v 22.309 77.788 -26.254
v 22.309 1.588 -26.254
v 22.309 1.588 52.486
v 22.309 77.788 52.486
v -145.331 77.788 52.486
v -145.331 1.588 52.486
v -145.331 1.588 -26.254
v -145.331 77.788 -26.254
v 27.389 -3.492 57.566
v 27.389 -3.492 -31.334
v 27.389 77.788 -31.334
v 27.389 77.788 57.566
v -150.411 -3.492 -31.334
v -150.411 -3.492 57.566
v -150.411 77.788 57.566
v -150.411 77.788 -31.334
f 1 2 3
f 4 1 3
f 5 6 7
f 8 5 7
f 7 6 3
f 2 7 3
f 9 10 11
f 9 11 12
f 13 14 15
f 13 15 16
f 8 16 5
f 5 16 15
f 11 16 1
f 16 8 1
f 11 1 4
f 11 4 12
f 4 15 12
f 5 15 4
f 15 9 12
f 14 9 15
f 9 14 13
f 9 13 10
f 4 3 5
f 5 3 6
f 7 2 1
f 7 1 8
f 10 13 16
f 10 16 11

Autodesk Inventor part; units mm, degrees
ref_plane "YZ Plane" through (0, 0, 0) normal (1, 0, 0) x (0, 1, 0)
ref_plane "XZ Plane" through (0, 0, 0) normal (0, 1, 0) x (-1, 0, 0)
ref_plane "Work Plane1" through (-43.4917, 1.5875, -7.62) normal (0, -1, 0) x (1, 0, 0)
sketch "Sketch3" plane through (-43.4917, 1.5875, -7.62) normal (0, -1, 0) x (1, 0, 0)
  line L0 (-106.9189, -23.7145) -> (70.8811, -23.7145)
  line L1 (70.8811, -23.7145) -> (70.8811, 65.1855)
  line L2 (70.8811, 65.1855) -> (-106.9189, 65.1855)
  line L3 (-106.9189, 65.1855) -> (-106.9189, -23.7145)
  line L4 (-106.9189, -23.7145) -> (70.8811, -23.7145)
  line L5 (70.8811, -23.7145) -> (70.8811, -18.6345)
  line L6 (70.8811, -18.6345) -> (-106.9189, -18.6345)
  line L7 (-106.9189, -18.6345) -> (-106.9189, -23.7145)
  line L8 (-106.9189, 65.1855) -> (-101.8389, 65.1855)
  line L9 (-101.8389, 65.1855) -> (-101.8389, -23.7145)
  line L10 (-101.8389, -23.7145) -> (-106.9189, -23.7145)
  line L11 (-106.9189, -23.7145) -> (-106.9189, 65.1855)
  line L12 (-106.9189, 65.1855) -> (70.8811, 65.1855)
  line L13 (70.8811, 65.1855) -> (70.8811, 60.1055)
  line L14 (70.8811, 60.1055) -> (-106.9189, 60.1055)
  line L15 (-106.9189, 60.1055) -> (-106.9189, 65.1855)
  line L16 (70.8811, -23.7145) -> (65.8011, -23.7145)
  line L17 (65.8011, -23.7145) -> (65.8011, 65.1855)
  line L18 (65.8011, 65.1855) -> (70.8811, 65.1855)
  line L19 (70.8811, 65.1855) -> (70.8811, -23.7145)
  point P0 (43.4917, 7.62)
  dimension "d1" = 177.8
  dimension "d2" = 88.9
  dimension "d3" = 5.08
  dimension "d4" = 5.08
  dimension "d5" = 5.08
  dimension "d6" = 5.08
extrude "Extrusion1" add sketch "Sketch3" against normal blind 76.2 contours L3 L2 L9 L14 | L9 L2 L17 L14 | L17 L2 L1 L14
extrude "Extrusion2" cut sketch "Sketch3" against normal blind 76.2 contours L3 L6 L9 L0 | L3 L14 L9 L6 | L3 L2 L9 L14
extrude "Extrusion3" cut sketch "Sketch3" against normal blind 76.2 contours L3 L6 L9 L0 | L9 L6 L17 L0 | L3 L14 L9 L6 | L17 L6 L1 L0 | L3 L2 L9 L14 | L17 L14 L1 L6 | L17 L2 L1 L14
extrude "Extrusion4" add sketch "Sketch3" against normal blind 76.2 contours L3 L6 L9 L0 | L3 L14 L9 L6 | L3 L2 L9 L14
extrude "Extrusion5" add sketch "Sketch3" against normal blind 76.2 contours L17 L6 L1 L0 | L17 L14 L1 L6 | L17 L2 L1 L14
extrude "Extrusion6" add sketch "Sketch3" against normal blind 76.2 contours L3 L6 L9 L0 | L9 L6 L17 L0 | L17 L6 L1 L0
extrude "Extrusion7" add sketch "Sketch3" along normal blind 5.08 contours L9 L14 L17 L6
extrude "Extrusion8" add sketch "Sketch3" along normal blind 5.08 contours L17 L6 L1 L0 | L17 L14 L1 L6 | L17 L2 L1 L14
extrude "Extrusion9" add sketch "Sketch3" along normal blind 5.08 contours L3 L6 L9 L0 | L9 L6 L17 L0 | L17 L6 L1 L0
extrude "Extrusion10" add sketch "Sketch3" along normal blind 5.08 contours L3 L6 L9 L0 | L3 L14 L9 L6 | L3 L2 L9 L14
extrude "Extrusion11" add sketch "Sketch3" along normal blind 5.08 contours L3 L2 L9 L14 | L9 L2 L17 L14 | L17 L2 L1 L14
properties part number "enclosure"
